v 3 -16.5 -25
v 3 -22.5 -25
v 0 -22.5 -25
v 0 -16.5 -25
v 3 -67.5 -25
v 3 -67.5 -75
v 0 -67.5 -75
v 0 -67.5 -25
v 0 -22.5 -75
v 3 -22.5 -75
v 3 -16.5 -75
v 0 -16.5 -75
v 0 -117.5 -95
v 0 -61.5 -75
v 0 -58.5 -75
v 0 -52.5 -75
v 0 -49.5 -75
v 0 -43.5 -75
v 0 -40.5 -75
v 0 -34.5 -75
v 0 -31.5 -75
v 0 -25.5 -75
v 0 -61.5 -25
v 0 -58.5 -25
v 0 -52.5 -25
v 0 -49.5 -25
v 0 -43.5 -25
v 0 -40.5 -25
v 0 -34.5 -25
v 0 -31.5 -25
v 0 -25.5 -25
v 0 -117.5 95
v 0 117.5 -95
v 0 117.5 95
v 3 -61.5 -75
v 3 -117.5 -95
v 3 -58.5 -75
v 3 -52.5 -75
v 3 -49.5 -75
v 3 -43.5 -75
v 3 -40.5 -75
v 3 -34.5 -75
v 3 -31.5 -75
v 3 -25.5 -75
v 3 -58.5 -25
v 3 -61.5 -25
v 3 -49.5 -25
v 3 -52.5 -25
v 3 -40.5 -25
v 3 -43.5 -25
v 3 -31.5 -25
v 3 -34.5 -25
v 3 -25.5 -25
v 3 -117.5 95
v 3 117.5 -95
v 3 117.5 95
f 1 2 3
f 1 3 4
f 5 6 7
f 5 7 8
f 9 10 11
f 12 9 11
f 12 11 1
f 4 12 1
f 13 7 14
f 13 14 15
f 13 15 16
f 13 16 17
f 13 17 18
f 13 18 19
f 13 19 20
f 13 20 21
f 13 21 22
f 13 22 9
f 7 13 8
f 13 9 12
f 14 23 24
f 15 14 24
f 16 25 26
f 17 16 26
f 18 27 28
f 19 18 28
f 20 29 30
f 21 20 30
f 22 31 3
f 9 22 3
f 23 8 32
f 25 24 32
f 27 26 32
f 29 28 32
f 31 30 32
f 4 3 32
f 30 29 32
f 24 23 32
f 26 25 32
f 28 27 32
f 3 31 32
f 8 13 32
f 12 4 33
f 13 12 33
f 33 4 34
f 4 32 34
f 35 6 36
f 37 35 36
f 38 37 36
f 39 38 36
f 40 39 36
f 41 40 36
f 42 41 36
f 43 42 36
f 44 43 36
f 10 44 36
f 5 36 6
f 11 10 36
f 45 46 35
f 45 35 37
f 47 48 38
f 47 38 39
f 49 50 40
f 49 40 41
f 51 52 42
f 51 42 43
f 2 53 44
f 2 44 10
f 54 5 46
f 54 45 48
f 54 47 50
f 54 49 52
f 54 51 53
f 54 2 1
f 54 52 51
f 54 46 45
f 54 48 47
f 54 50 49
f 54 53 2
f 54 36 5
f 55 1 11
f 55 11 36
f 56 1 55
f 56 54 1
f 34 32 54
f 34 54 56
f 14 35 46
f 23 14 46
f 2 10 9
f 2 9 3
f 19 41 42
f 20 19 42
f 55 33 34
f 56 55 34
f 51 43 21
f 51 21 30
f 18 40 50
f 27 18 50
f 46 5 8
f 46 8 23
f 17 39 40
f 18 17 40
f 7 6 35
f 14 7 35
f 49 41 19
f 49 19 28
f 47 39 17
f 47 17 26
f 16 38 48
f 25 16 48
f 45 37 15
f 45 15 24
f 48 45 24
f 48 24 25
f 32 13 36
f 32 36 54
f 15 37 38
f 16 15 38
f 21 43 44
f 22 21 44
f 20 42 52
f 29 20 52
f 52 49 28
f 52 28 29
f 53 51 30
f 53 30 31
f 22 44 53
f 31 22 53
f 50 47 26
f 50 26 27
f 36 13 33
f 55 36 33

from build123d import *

# Parameters (mm, degrees)
F0_W     = 235
F0_H     = 190
F1_DEPTH = 3
F2_W     = 6
F2_H     = 50
F3_DEPTH = 25


with BuildPart() as f1:
    # F0 (on Right) → F1 (new body)
    with BuildSketch(Plane.YZ):
        Rectangle(F0_W, F0_H)
    extrude(amount=F1_DEPTH)

    # F2 (on face) → F3 (cut)
    with BuildSketch(Plane.YZ.offset(3)):
        with Locations((-64.5, -50)):
            Rectangle(F2_W, F2_H)
        with Locations((-55.5, -50)):
            Rectangle(F2_W, F2_H)
        with Locations((-46.5, -50)):
            Rectangle(F2_W, F2_H)
        with Locations((-37.5, -50)):
            Rectangle(F2_W, F2_H)
        with Locations((-28.5, -50)):
            Rectangle(F2_W, F2_H)
        with Locations((-19.5, -50)):
            Rectangle(F2_W, F2_H)
    extrude(amount=-F3_DEPTH, mode=Mode.SUBTRACT)


solid = f1.part
